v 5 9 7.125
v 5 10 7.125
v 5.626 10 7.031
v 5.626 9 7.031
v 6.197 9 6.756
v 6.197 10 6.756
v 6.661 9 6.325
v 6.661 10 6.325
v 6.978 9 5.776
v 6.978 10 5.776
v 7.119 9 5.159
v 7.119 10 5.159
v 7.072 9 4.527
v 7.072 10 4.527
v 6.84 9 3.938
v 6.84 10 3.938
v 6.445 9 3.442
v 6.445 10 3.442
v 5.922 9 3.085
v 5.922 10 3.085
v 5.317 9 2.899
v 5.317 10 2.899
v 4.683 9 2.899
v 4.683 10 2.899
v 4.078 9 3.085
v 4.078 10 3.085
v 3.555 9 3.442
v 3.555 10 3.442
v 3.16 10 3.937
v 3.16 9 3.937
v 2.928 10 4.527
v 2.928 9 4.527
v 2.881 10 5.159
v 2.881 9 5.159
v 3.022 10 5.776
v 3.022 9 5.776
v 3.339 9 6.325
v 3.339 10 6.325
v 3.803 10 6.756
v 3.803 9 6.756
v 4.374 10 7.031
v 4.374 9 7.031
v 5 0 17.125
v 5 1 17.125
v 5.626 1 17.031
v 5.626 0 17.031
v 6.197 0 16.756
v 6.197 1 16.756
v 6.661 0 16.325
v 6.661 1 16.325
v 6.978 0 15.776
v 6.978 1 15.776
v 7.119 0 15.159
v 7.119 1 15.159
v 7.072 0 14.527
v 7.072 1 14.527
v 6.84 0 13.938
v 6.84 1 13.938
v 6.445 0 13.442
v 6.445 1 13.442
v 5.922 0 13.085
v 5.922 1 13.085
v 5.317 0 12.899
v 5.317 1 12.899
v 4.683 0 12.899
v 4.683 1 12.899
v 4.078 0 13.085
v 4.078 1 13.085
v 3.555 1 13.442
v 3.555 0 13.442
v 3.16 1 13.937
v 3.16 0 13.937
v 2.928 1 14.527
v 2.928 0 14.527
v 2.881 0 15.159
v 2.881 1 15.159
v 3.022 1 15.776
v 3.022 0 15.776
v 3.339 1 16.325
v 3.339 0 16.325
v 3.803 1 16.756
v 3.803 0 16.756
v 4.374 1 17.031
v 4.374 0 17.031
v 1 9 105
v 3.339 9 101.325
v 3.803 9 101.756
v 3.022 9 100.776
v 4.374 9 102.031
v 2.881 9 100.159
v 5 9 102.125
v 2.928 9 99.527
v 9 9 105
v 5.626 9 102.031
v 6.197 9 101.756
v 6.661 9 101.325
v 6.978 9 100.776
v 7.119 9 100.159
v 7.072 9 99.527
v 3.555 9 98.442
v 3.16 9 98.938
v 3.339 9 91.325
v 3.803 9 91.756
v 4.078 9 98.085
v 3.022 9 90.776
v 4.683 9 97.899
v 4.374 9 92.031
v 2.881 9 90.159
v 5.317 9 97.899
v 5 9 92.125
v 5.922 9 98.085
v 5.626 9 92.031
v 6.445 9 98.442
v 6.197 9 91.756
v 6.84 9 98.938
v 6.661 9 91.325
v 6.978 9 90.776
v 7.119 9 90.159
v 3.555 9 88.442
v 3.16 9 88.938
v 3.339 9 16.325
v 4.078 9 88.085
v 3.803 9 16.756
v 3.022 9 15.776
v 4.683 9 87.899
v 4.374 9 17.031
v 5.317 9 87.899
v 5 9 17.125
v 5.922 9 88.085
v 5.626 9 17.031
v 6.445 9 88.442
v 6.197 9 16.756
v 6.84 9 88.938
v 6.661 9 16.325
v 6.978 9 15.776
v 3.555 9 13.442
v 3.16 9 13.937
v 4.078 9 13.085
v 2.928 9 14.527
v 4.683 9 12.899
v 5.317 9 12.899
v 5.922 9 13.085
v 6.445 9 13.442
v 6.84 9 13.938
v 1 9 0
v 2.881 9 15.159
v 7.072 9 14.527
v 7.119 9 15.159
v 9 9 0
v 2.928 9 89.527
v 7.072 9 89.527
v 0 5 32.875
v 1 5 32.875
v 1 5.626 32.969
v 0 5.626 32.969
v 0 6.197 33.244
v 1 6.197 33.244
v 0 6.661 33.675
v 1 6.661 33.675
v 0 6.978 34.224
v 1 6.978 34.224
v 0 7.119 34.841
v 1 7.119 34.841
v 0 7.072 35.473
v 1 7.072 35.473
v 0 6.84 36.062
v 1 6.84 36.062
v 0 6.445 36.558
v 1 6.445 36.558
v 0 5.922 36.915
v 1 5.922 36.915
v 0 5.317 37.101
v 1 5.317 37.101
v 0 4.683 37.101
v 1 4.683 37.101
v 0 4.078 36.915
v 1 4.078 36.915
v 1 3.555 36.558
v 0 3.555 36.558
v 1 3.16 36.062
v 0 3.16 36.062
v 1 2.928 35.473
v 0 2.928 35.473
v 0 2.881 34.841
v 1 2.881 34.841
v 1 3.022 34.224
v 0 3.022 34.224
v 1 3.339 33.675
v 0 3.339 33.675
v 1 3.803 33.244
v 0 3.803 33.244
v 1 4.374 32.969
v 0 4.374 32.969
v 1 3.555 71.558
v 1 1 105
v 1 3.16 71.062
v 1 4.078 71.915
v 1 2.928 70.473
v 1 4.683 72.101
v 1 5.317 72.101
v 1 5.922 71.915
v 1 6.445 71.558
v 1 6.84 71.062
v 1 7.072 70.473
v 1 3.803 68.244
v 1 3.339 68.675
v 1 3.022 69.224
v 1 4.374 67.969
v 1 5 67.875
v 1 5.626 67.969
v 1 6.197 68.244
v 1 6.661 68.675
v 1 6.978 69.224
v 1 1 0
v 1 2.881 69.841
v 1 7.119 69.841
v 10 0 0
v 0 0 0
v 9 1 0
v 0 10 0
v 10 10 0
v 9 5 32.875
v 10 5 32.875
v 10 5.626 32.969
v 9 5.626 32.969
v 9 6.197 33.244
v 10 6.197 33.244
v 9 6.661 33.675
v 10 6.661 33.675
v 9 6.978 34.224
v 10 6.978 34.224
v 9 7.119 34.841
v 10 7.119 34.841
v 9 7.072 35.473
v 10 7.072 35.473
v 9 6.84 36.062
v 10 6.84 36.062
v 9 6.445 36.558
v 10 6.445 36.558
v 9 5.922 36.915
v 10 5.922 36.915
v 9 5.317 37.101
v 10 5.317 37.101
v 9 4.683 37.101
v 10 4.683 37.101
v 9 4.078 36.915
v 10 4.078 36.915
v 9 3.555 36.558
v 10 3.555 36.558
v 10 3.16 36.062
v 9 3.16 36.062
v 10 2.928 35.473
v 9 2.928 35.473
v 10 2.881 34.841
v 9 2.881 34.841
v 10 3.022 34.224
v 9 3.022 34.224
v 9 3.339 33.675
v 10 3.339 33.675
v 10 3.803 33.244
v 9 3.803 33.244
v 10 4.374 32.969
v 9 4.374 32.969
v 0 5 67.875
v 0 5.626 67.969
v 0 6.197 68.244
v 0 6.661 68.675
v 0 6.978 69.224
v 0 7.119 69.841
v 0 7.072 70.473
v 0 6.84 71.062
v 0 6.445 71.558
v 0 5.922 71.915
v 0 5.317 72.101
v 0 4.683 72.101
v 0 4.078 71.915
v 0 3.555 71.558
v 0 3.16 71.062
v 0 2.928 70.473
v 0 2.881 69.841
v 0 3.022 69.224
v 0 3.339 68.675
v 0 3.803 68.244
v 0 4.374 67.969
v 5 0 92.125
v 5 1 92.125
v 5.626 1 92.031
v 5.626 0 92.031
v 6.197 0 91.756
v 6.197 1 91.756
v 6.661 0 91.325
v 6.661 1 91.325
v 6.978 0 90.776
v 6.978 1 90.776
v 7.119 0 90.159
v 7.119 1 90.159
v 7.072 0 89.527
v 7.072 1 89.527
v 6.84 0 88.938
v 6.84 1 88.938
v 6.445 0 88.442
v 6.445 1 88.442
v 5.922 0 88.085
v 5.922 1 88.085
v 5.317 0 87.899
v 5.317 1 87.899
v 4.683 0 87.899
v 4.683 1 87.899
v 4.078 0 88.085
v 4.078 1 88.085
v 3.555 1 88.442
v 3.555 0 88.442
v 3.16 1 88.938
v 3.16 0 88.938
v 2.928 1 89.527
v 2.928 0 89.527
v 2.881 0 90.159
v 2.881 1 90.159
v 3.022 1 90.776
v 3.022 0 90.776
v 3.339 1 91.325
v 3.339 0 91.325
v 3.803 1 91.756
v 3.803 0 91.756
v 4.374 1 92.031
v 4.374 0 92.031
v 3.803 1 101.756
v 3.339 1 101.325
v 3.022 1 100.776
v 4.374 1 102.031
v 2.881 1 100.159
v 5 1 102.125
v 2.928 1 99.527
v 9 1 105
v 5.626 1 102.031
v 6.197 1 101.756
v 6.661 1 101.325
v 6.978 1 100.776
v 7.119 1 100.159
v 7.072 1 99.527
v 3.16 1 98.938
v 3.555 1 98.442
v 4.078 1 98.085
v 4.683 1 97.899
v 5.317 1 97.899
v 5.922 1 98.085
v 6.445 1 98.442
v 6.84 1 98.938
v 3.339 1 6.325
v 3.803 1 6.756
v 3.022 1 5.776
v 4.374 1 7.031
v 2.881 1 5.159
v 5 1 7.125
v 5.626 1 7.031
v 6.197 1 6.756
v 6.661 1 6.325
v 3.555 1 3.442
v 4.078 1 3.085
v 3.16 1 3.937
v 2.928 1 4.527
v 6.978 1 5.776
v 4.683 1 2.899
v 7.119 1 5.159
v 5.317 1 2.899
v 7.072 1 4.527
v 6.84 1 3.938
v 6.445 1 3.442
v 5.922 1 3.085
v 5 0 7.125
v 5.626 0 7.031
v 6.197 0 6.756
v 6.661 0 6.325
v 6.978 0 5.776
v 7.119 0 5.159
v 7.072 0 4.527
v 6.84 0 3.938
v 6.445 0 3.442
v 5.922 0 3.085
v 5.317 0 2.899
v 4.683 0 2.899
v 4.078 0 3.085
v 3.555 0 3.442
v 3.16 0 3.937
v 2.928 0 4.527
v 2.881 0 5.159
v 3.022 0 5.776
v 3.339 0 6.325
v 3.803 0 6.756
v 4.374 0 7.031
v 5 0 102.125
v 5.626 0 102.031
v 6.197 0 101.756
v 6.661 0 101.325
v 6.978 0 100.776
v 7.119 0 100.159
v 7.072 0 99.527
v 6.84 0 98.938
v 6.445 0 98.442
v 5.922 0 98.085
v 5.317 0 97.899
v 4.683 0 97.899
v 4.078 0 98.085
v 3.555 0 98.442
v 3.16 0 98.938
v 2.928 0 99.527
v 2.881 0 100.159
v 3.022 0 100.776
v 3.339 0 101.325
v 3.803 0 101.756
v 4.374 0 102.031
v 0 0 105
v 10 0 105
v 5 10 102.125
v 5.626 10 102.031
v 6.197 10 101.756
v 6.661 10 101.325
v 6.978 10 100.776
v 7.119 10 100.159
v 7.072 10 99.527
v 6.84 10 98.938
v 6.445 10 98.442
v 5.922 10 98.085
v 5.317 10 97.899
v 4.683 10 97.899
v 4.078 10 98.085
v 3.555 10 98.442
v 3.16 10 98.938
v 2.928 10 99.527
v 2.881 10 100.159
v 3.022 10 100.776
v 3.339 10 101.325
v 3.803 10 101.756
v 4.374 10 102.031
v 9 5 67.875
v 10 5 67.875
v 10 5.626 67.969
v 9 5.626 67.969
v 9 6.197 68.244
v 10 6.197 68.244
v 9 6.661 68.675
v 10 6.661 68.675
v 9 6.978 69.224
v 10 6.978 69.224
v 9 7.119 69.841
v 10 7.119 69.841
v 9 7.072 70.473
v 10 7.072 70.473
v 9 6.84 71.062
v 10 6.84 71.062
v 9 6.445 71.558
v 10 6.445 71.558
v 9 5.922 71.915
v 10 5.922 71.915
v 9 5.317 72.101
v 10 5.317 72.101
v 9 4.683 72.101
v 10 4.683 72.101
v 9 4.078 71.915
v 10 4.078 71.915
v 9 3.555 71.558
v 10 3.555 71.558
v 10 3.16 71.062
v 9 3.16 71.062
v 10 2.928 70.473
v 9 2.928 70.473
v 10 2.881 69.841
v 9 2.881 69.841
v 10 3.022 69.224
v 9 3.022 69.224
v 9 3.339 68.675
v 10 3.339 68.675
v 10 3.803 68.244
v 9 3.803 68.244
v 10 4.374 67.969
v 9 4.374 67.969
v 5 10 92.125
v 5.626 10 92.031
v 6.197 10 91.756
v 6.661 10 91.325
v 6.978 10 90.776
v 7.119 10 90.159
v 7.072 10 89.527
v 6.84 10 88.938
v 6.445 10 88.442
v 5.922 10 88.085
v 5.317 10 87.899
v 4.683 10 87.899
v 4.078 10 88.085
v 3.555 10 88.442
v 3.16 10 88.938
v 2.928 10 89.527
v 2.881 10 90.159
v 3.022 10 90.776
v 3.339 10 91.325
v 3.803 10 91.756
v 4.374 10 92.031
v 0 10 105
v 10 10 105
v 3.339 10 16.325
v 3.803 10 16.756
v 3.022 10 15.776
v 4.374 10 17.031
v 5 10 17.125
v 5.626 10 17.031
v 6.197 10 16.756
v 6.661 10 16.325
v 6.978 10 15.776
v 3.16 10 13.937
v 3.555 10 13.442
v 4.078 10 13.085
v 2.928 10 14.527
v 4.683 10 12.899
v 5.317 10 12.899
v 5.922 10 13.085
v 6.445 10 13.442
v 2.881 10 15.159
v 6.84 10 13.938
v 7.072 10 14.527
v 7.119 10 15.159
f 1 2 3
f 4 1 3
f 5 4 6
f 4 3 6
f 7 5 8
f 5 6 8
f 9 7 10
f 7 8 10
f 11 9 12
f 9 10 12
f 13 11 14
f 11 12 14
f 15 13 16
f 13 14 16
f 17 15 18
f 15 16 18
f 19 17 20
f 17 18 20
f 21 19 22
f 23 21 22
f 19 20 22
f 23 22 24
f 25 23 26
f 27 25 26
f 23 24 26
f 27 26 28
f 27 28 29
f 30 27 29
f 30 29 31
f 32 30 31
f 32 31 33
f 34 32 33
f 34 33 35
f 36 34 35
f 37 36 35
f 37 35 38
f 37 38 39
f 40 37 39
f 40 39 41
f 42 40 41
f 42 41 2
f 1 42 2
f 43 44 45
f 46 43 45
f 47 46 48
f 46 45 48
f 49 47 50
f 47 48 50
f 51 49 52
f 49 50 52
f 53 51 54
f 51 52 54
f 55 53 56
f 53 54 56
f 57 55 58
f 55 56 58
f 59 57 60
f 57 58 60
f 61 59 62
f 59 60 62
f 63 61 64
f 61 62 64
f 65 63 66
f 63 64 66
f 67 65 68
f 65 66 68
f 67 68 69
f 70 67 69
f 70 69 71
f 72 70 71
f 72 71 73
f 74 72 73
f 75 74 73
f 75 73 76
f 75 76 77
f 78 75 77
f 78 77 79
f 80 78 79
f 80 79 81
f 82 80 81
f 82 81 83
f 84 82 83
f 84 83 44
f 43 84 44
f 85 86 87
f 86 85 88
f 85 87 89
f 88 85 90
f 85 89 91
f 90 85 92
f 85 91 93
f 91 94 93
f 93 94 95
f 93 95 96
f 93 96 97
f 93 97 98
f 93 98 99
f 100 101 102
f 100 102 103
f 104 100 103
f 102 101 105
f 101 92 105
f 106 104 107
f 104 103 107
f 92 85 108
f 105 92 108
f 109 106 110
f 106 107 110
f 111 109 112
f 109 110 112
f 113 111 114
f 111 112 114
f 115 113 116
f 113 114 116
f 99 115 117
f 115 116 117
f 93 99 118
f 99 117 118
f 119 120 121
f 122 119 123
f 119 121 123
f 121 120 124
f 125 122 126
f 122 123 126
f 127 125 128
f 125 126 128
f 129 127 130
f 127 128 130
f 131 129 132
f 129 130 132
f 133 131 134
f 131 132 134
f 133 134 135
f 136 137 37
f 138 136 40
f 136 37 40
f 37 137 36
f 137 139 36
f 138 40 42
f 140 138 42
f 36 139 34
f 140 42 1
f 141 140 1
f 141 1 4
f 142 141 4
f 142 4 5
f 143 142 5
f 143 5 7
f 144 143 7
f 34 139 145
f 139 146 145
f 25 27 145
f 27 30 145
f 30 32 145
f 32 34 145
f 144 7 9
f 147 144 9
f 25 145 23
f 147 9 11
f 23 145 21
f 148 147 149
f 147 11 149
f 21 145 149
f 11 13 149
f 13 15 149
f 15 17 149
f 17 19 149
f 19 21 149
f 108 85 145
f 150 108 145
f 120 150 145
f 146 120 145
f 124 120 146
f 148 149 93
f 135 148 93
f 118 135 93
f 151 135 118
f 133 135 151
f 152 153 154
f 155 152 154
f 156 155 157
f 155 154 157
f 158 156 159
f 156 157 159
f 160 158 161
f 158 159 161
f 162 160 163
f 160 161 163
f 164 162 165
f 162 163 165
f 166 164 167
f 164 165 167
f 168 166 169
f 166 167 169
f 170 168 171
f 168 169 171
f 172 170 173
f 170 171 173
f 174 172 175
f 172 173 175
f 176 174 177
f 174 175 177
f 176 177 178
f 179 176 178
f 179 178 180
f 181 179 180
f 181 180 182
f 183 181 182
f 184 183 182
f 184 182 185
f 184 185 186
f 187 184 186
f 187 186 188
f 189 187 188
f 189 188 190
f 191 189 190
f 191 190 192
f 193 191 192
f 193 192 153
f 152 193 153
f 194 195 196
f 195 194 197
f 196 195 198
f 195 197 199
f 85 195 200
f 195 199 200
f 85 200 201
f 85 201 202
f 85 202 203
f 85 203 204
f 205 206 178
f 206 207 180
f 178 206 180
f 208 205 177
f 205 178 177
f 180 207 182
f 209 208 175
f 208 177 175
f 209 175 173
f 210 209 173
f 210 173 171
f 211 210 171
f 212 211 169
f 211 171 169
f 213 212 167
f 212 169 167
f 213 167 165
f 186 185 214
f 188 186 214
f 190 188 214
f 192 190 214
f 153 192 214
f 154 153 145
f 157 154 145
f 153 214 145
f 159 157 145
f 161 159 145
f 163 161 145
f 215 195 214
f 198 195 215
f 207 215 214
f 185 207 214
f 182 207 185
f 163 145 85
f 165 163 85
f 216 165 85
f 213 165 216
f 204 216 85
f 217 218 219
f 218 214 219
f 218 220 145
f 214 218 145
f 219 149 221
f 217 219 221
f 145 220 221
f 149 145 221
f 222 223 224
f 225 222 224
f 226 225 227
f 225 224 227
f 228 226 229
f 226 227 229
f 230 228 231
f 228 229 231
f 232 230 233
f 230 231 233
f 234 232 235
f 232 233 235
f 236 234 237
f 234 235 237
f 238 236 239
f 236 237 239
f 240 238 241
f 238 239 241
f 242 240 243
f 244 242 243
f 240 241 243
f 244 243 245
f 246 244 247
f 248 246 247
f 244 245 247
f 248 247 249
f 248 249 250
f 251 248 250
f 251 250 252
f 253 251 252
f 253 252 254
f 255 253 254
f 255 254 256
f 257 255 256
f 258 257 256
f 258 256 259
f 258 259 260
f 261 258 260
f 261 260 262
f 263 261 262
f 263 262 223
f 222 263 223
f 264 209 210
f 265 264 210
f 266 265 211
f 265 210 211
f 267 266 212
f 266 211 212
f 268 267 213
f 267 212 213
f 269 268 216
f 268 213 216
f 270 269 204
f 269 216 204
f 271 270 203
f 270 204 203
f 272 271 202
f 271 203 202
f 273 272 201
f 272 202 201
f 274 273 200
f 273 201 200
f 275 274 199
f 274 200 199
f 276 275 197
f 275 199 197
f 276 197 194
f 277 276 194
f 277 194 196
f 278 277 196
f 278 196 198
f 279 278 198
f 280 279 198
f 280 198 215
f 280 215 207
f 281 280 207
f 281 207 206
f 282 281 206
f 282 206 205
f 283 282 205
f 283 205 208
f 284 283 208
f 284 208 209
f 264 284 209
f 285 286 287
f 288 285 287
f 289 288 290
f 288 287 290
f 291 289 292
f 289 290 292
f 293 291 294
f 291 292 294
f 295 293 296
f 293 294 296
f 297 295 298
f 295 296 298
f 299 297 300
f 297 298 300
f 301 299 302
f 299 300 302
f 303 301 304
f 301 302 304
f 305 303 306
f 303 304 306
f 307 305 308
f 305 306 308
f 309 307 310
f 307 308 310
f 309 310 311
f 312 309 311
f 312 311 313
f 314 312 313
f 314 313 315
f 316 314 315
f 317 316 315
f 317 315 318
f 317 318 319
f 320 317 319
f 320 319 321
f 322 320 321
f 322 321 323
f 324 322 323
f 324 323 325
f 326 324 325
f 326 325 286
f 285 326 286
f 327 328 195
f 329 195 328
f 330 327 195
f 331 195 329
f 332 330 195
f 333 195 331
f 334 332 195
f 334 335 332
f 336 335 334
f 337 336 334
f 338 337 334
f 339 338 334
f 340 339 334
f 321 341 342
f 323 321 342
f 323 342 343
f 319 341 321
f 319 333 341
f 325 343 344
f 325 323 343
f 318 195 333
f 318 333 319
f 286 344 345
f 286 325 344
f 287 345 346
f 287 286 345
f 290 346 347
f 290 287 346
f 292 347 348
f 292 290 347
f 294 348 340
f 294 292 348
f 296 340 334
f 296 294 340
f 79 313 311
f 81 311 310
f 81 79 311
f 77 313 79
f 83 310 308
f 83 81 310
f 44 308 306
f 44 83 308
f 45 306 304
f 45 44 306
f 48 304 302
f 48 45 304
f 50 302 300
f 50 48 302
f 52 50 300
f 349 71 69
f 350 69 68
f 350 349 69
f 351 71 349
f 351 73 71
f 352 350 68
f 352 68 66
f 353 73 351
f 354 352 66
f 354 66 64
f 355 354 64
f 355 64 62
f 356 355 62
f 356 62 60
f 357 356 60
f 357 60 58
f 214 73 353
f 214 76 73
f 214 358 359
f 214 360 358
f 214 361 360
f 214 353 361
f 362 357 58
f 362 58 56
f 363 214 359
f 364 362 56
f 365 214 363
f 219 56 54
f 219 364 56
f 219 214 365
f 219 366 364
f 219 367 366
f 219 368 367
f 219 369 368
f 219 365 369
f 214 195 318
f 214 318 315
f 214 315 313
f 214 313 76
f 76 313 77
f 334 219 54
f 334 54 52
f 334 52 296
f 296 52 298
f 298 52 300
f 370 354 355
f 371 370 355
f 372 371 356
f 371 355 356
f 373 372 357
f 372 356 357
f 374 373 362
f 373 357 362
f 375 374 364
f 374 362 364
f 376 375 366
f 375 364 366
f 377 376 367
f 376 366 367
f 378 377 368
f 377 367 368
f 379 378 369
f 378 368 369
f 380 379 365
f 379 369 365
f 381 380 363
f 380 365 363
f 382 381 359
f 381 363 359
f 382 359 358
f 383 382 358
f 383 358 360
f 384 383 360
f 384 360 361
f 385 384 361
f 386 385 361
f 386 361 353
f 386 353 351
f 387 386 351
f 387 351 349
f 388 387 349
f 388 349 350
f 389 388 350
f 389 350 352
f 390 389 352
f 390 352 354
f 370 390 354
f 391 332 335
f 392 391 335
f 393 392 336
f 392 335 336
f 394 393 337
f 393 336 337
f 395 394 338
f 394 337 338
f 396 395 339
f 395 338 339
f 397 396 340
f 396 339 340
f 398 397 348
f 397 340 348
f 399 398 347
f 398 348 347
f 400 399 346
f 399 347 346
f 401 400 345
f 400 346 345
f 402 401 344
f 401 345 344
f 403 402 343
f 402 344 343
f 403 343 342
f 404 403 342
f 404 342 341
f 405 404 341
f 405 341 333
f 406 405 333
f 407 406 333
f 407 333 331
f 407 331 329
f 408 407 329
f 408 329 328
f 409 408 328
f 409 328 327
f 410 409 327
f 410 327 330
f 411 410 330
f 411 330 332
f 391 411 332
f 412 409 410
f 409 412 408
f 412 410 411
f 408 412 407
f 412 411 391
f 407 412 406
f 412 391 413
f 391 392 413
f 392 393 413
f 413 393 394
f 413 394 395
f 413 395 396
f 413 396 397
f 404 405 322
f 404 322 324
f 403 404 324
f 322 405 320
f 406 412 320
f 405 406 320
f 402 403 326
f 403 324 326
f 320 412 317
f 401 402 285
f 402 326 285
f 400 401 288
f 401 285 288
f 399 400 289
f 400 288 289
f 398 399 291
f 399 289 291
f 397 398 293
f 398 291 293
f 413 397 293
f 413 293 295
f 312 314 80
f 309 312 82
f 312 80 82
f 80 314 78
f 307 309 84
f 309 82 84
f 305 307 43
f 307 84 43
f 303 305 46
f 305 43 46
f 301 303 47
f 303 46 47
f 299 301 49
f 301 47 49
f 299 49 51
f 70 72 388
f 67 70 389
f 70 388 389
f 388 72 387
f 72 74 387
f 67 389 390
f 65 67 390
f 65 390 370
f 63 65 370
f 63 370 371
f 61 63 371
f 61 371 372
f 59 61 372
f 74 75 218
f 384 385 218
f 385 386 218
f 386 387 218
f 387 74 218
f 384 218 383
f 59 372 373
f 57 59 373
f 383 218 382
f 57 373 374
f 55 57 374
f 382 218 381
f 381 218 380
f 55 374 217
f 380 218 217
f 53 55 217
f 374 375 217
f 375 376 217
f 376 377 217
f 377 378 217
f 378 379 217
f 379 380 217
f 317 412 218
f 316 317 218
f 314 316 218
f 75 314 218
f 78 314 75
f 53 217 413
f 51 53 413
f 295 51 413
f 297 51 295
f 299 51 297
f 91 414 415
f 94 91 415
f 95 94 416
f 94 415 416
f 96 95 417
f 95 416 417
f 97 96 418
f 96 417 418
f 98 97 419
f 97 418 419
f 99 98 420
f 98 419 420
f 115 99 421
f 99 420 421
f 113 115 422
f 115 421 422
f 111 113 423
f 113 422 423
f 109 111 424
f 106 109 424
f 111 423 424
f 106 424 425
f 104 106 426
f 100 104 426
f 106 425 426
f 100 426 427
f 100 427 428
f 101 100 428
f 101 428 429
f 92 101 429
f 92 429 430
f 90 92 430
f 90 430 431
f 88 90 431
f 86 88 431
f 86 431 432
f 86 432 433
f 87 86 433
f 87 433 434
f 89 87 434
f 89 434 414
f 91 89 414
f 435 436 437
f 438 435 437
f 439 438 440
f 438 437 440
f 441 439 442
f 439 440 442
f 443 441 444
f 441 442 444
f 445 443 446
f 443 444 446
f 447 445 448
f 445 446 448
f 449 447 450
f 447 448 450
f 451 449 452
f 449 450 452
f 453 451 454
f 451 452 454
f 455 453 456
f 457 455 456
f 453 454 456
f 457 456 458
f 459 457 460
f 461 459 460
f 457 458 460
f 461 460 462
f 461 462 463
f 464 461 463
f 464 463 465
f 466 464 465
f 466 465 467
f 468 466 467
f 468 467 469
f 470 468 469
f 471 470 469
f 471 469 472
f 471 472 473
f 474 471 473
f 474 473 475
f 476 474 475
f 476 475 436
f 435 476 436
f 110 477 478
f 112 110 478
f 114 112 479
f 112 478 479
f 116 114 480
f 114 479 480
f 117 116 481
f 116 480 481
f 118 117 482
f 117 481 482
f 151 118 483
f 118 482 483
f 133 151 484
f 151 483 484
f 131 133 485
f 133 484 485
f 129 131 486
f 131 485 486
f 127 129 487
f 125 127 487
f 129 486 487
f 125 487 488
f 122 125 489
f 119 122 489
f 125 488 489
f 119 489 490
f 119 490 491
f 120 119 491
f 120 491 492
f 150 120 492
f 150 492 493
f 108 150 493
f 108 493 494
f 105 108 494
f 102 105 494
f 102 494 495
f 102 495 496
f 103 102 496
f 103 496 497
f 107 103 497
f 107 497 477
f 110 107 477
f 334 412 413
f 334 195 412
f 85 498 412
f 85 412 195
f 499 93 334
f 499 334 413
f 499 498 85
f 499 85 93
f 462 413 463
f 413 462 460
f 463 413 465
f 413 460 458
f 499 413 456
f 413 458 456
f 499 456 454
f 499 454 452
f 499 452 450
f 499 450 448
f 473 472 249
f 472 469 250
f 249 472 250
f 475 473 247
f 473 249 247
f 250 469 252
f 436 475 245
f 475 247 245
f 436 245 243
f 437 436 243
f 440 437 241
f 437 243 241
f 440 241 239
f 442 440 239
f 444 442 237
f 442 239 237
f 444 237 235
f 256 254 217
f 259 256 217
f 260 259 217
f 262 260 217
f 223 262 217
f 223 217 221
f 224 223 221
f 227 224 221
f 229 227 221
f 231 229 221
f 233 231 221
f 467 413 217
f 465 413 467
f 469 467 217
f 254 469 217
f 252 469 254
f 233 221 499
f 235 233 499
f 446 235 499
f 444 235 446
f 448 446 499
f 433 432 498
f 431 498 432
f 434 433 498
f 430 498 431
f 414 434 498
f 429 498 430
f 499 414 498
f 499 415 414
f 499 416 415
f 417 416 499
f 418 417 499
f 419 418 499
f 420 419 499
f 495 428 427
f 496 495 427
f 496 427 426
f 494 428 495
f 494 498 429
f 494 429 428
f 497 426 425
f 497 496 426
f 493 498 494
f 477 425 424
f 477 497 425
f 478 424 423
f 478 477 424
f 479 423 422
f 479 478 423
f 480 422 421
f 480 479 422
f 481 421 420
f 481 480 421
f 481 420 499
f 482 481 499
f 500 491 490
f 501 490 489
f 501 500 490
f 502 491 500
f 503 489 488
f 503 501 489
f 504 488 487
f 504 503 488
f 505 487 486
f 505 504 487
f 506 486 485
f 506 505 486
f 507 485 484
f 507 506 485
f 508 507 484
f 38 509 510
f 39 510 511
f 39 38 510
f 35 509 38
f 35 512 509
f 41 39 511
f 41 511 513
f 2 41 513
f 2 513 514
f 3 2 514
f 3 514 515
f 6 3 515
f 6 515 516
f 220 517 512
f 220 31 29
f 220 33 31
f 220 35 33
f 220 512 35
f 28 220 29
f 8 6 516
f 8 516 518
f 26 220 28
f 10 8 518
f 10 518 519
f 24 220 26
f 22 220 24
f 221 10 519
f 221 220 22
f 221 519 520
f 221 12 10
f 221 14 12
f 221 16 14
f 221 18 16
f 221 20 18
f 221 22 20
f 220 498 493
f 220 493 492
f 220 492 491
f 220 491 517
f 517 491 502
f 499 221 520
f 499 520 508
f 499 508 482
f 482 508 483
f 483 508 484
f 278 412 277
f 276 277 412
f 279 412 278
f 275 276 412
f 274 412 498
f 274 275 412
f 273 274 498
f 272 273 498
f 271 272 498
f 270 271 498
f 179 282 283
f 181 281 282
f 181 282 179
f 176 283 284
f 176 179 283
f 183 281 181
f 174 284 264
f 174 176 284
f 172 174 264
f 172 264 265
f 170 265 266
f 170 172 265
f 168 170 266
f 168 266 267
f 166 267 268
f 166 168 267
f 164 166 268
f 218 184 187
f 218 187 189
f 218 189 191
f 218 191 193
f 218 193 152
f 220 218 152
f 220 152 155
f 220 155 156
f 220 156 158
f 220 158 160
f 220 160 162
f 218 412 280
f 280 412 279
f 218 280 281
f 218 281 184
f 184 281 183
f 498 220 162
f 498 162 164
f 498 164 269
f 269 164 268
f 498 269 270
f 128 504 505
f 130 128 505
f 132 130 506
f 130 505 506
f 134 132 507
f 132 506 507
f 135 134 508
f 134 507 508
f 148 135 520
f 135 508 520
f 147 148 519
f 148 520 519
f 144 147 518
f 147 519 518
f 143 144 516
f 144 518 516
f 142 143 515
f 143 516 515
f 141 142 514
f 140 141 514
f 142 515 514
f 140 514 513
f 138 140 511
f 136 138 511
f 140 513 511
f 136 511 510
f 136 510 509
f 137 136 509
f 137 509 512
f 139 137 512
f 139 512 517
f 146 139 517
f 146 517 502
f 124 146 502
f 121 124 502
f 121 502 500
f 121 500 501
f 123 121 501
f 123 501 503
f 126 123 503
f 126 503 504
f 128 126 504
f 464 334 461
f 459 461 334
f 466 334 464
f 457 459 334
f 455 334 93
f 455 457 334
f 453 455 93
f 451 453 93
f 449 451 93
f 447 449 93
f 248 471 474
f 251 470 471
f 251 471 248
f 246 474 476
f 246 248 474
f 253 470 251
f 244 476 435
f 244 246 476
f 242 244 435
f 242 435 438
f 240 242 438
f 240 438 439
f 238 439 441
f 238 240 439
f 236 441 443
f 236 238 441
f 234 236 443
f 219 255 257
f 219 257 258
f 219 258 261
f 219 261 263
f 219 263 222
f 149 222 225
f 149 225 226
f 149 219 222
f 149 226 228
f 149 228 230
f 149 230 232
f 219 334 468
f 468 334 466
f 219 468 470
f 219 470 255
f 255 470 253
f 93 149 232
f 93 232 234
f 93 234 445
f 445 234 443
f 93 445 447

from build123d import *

# Parameters (mm, degrees)
SKETCH1_W           = 10
SKETCH1_H           = 10
SKETCH1_W_2         = 8
SKETCH1_H_2         = 8
BOSS_EXTRUDE1_DEPTH = 105
SKETCH2_R           = 2.125
CUT_EXTRUDE1_DEPTH  = 116
SKETCH4_R           = 2.125
CUT_EXTRUDE3_DEPTH  = 10


with BuildPart() as part:
    # Sketch1 → Boss-Extrude1 (new body)
    with BuildSketch(Plane.XY):
        with Locations((5, 5)):
            Rectangle(SKETCH1_W, SKETCH1_H)
        with Locations((5, 5)):
            Rectangle(SKETCH1_W_2, SKETCH1_H_2, mode=Mode.SUBTRACT)
    extrude(amount=BOSS_EXTRUDE1_DEPTH)

    # Sketch2 → Cut-Extrude1 (cut)
    with BuildSketch(Plane(origin=(0, 10, 0), x_dir=(1, 0, 0), z_dir=(0, 1, 0))):
        with Locations(Location((5, -5, 0), (0, 0, 270))):
            Circle(SKETCH2_R)
        with Locations(Location((5, -15, 0), (0, 0, 270))):
            Circle(SKETCH2_R)
        with Locations(Location((5, -100, 0), (0, 0, 270))):
            Circle(SKETCH2_R)
        with Locations(Location((5, -90, 0), (0, 0, 270))):
            Circle(SKETCH2_R)
    extrude(amount=-CUT_EXTRUDE1_DEPTH, mode=Mode.SUBTRACT)

    # Sketch4 → Cut-Extrude3 (cut)
    with BuildSketch(Plane(origin=(10, 0, 0), x_dir=(0, 0, -1), z_dir=(1, 0, 0))):
        with Locations((-70, 5)):
            Circle(SKETCH4_R)
        with Locations((-35, 5)):
            Circle(SKETCH4_R)
    extrude(amount=-CUT_EXTRUDE3_DEPTH, mode=Mode.SUBTRACT)


solid = part.part
